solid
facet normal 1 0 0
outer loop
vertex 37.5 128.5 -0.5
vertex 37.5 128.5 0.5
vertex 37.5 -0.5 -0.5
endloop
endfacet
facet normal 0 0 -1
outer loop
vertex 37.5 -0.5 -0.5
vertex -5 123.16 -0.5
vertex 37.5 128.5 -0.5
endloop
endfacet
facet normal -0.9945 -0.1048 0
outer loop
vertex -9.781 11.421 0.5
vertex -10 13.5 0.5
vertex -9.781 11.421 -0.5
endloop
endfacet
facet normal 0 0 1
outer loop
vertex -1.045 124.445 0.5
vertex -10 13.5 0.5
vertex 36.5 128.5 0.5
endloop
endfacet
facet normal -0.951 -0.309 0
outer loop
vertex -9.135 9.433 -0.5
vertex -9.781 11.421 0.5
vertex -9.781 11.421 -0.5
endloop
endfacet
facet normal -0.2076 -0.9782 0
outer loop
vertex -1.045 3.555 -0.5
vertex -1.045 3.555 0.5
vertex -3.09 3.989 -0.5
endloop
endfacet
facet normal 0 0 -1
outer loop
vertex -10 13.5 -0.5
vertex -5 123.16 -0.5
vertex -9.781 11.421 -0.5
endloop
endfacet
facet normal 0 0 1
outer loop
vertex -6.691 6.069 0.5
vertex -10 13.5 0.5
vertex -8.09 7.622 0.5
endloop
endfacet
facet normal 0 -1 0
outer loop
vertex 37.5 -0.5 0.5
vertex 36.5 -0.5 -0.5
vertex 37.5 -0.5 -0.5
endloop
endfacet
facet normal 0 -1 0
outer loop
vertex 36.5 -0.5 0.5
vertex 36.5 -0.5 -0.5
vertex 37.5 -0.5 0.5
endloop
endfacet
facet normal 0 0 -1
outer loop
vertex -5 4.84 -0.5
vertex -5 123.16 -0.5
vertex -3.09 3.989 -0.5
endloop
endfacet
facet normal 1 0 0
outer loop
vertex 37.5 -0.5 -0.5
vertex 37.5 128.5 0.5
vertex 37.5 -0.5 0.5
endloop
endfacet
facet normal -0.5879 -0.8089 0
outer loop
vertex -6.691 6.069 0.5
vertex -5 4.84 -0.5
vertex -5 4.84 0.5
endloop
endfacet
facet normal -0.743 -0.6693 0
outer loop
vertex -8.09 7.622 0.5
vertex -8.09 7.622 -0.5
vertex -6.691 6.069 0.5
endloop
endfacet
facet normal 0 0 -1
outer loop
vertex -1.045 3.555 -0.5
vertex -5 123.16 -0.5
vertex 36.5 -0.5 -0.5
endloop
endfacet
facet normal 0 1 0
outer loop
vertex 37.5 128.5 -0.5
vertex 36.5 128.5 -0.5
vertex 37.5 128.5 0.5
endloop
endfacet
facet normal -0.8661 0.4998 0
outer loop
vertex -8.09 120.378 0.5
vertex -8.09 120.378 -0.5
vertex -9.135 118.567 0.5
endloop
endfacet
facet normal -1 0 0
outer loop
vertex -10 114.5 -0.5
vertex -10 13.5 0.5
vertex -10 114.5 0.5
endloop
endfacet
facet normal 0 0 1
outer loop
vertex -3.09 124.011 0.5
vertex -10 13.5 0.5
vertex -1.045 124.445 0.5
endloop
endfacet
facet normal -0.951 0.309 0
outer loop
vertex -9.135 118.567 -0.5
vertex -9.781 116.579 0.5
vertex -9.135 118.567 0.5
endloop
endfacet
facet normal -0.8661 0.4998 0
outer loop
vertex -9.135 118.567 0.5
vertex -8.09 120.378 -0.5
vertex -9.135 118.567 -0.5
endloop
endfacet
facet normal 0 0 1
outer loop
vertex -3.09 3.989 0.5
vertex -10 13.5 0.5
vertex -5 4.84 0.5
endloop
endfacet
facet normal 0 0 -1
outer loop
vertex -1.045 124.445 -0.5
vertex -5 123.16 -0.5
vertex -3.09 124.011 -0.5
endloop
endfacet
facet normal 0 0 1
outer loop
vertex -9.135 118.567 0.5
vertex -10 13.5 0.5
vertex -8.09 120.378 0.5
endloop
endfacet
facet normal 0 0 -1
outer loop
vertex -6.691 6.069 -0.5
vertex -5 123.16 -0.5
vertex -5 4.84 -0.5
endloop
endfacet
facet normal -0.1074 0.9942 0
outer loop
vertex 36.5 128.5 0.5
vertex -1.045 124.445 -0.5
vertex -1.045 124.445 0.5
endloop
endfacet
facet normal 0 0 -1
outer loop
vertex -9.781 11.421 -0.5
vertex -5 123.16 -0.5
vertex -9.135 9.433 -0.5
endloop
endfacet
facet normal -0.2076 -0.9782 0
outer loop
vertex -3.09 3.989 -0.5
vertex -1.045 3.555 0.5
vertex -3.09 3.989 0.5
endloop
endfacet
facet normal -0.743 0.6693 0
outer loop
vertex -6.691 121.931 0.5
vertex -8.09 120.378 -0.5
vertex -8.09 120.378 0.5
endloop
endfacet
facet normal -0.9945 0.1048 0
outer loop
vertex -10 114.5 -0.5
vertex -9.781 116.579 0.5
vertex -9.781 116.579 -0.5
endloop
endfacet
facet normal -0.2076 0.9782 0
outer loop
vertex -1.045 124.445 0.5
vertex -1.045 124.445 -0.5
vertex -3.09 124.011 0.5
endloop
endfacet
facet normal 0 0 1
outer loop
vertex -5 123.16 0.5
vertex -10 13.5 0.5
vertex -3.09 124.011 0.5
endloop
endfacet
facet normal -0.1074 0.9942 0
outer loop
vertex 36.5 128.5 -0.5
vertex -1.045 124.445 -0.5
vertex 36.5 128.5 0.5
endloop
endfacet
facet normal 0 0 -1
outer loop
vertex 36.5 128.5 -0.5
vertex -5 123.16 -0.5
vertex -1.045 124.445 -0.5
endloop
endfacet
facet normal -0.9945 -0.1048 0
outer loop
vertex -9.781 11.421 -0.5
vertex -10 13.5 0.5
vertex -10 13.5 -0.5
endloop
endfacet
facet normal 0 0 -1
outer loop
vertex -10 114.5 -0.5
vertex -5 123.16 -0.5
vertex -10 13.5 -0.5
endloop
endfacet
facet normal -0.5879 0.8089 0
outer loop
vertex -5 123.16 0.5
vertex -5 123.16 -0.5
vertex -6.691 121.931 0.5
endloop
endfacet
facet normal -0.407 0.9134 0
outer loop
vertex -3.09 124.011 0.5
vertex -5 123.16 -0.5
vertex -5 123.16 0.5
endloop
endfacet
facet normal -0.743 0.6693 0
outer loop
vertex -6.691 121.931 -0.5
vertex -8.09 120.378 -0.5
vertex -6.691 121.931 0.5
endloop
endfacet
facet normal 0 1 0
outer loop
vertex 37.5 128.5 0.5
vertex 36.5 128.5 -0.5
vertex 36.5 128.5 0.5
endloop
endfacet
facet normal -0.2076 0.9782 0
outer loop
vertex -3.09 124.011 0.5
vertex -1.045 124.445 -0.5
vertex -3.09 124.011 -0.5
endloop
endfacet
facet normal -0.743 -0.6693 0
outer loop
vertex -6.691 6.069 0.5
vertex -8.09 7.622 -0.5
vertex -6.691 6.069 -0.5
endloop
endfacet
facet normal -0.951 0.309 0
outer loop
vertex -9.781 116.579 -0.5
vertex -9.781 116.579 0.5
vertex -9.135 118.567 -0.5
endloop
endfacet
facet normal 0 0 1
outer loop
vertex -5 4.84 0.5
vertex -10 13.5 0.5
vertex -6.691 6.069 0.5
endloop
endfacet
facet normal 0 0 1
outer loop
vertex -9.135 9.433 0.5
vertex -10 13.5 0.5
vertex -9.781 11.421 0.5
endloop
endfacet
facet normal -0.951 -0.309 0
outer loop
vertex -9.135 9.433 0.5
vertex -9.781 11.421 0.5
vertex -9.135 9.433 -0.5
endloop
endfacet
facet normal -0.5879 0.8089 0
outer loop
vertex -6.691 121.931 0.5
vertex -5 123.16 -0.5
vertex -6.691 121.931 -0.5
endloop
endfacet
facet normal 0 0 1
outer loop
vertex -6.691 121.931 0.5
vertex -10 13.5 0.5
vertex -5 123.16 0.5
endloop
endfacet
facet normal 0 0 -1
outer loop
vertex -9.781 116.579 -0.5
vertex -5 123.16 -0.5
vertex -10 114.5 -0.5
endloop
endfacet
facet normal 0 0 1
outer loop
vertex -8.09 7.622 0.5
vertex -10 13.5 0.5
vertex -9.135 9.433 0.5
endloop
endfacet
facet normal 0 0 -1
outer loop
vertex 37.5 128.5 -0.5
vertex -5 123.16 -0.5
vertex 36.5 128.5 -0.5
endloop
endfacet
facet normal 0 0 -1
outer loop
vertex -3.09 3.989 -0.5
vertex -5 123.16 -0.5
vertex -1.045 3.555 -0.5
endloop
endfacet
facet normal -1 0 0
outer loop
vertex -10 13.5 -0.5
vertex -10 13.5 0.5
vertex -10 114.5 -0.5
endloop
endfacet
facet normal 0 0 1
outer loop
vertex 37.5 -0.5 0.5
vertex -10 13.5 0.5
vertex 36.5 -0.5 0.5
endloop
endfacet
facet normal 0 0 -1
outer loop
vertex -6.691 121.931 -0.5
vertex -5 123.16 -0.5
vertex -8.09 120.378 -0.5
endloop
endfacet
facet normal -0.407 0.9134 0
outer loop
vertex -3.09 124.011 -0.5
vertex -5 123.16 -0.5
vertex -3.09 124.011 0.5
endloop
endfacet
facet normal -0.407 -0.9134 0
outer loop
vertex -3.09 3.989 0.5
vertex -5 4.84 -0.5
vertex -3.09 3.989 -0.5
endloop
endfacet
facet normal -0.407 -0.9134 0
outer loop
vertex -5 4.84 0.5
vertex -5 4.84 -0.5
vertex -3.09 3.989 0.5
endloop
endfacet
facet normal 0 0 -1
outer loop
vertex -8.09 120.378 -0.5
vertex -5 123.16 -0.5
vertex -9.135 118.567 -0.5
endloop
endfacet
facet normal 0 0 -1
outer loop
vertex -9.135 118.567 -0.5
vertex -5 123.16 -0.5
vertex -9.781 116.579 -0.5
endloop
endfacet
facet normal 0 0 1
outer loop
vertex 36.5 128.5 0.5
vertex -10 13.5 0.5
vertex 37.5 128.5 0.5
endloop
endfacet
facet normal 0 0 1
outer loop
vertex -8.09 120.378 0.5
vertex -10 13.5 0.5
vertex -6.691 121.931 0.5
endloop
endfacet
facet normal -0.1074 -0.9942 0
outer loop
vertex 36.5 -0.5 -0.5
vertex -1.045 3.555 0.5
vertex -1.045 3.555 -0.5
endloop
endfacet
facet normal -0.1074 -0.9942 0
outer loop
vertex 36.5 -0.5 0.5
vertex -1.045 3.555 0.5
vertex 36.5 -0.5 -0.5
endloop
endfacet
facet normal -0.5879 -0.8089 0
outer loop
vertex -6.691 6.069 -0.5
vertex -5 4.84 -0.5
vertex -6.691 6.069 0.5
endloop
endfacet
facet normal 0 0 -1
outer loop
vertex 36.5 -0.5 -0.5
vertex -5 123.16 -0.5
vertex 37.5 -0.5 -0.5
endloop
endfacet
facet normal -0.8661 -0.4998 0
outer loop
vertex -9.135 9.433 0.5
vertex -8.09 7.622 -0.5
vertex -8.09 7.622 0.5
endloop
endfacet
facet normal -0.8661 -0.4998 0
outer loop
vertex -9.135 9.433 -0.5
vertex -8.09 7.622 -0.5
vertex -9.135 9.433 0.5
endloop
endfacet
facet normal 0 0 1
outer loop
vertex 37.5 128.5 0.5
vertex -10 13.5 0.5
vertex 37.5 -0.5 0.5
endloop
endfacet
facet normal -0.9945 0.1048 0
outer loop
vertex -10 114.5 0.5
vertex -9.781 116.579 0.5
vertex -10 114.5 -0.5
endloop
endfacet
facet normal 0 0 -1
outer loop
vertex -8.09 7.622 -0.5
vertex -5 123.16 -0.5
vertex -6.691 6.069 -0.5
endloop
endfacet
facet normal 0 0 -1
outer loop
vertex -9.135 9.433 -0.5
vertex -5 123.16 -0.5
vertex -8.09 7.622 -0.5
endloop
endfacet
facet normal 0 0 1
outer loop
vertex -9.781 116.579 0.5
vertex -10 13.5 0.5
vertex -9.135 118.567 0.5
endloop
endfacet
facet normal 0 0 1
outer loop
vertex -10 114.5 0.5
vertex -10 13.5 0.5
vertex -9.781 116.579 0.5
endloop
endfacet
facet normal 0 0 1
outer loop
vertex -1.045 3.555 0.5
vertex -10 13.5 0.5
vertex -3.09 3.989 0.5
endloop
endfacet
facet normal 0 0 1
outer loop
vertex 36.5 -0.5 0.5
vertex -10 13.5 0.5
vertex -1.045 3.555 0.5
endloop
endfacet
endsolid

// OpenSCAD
topL = 128;
bottomL = 111;
h = 37;
d=1;
rad=10;

hull(){
    translate([h,0,0])
    cube([1,1,d],true);
    translate([h,topL,0])
    cube([1,1,d],true);
    translate([0,((topL-bottomL)/2)+rad/2,0])
    union(){
        cylinder(r=rad, h=d,center= true);
        translate([0,bottomL-rad,0])
        cylinder(r=rad, h=d,center= true);
    }
}
